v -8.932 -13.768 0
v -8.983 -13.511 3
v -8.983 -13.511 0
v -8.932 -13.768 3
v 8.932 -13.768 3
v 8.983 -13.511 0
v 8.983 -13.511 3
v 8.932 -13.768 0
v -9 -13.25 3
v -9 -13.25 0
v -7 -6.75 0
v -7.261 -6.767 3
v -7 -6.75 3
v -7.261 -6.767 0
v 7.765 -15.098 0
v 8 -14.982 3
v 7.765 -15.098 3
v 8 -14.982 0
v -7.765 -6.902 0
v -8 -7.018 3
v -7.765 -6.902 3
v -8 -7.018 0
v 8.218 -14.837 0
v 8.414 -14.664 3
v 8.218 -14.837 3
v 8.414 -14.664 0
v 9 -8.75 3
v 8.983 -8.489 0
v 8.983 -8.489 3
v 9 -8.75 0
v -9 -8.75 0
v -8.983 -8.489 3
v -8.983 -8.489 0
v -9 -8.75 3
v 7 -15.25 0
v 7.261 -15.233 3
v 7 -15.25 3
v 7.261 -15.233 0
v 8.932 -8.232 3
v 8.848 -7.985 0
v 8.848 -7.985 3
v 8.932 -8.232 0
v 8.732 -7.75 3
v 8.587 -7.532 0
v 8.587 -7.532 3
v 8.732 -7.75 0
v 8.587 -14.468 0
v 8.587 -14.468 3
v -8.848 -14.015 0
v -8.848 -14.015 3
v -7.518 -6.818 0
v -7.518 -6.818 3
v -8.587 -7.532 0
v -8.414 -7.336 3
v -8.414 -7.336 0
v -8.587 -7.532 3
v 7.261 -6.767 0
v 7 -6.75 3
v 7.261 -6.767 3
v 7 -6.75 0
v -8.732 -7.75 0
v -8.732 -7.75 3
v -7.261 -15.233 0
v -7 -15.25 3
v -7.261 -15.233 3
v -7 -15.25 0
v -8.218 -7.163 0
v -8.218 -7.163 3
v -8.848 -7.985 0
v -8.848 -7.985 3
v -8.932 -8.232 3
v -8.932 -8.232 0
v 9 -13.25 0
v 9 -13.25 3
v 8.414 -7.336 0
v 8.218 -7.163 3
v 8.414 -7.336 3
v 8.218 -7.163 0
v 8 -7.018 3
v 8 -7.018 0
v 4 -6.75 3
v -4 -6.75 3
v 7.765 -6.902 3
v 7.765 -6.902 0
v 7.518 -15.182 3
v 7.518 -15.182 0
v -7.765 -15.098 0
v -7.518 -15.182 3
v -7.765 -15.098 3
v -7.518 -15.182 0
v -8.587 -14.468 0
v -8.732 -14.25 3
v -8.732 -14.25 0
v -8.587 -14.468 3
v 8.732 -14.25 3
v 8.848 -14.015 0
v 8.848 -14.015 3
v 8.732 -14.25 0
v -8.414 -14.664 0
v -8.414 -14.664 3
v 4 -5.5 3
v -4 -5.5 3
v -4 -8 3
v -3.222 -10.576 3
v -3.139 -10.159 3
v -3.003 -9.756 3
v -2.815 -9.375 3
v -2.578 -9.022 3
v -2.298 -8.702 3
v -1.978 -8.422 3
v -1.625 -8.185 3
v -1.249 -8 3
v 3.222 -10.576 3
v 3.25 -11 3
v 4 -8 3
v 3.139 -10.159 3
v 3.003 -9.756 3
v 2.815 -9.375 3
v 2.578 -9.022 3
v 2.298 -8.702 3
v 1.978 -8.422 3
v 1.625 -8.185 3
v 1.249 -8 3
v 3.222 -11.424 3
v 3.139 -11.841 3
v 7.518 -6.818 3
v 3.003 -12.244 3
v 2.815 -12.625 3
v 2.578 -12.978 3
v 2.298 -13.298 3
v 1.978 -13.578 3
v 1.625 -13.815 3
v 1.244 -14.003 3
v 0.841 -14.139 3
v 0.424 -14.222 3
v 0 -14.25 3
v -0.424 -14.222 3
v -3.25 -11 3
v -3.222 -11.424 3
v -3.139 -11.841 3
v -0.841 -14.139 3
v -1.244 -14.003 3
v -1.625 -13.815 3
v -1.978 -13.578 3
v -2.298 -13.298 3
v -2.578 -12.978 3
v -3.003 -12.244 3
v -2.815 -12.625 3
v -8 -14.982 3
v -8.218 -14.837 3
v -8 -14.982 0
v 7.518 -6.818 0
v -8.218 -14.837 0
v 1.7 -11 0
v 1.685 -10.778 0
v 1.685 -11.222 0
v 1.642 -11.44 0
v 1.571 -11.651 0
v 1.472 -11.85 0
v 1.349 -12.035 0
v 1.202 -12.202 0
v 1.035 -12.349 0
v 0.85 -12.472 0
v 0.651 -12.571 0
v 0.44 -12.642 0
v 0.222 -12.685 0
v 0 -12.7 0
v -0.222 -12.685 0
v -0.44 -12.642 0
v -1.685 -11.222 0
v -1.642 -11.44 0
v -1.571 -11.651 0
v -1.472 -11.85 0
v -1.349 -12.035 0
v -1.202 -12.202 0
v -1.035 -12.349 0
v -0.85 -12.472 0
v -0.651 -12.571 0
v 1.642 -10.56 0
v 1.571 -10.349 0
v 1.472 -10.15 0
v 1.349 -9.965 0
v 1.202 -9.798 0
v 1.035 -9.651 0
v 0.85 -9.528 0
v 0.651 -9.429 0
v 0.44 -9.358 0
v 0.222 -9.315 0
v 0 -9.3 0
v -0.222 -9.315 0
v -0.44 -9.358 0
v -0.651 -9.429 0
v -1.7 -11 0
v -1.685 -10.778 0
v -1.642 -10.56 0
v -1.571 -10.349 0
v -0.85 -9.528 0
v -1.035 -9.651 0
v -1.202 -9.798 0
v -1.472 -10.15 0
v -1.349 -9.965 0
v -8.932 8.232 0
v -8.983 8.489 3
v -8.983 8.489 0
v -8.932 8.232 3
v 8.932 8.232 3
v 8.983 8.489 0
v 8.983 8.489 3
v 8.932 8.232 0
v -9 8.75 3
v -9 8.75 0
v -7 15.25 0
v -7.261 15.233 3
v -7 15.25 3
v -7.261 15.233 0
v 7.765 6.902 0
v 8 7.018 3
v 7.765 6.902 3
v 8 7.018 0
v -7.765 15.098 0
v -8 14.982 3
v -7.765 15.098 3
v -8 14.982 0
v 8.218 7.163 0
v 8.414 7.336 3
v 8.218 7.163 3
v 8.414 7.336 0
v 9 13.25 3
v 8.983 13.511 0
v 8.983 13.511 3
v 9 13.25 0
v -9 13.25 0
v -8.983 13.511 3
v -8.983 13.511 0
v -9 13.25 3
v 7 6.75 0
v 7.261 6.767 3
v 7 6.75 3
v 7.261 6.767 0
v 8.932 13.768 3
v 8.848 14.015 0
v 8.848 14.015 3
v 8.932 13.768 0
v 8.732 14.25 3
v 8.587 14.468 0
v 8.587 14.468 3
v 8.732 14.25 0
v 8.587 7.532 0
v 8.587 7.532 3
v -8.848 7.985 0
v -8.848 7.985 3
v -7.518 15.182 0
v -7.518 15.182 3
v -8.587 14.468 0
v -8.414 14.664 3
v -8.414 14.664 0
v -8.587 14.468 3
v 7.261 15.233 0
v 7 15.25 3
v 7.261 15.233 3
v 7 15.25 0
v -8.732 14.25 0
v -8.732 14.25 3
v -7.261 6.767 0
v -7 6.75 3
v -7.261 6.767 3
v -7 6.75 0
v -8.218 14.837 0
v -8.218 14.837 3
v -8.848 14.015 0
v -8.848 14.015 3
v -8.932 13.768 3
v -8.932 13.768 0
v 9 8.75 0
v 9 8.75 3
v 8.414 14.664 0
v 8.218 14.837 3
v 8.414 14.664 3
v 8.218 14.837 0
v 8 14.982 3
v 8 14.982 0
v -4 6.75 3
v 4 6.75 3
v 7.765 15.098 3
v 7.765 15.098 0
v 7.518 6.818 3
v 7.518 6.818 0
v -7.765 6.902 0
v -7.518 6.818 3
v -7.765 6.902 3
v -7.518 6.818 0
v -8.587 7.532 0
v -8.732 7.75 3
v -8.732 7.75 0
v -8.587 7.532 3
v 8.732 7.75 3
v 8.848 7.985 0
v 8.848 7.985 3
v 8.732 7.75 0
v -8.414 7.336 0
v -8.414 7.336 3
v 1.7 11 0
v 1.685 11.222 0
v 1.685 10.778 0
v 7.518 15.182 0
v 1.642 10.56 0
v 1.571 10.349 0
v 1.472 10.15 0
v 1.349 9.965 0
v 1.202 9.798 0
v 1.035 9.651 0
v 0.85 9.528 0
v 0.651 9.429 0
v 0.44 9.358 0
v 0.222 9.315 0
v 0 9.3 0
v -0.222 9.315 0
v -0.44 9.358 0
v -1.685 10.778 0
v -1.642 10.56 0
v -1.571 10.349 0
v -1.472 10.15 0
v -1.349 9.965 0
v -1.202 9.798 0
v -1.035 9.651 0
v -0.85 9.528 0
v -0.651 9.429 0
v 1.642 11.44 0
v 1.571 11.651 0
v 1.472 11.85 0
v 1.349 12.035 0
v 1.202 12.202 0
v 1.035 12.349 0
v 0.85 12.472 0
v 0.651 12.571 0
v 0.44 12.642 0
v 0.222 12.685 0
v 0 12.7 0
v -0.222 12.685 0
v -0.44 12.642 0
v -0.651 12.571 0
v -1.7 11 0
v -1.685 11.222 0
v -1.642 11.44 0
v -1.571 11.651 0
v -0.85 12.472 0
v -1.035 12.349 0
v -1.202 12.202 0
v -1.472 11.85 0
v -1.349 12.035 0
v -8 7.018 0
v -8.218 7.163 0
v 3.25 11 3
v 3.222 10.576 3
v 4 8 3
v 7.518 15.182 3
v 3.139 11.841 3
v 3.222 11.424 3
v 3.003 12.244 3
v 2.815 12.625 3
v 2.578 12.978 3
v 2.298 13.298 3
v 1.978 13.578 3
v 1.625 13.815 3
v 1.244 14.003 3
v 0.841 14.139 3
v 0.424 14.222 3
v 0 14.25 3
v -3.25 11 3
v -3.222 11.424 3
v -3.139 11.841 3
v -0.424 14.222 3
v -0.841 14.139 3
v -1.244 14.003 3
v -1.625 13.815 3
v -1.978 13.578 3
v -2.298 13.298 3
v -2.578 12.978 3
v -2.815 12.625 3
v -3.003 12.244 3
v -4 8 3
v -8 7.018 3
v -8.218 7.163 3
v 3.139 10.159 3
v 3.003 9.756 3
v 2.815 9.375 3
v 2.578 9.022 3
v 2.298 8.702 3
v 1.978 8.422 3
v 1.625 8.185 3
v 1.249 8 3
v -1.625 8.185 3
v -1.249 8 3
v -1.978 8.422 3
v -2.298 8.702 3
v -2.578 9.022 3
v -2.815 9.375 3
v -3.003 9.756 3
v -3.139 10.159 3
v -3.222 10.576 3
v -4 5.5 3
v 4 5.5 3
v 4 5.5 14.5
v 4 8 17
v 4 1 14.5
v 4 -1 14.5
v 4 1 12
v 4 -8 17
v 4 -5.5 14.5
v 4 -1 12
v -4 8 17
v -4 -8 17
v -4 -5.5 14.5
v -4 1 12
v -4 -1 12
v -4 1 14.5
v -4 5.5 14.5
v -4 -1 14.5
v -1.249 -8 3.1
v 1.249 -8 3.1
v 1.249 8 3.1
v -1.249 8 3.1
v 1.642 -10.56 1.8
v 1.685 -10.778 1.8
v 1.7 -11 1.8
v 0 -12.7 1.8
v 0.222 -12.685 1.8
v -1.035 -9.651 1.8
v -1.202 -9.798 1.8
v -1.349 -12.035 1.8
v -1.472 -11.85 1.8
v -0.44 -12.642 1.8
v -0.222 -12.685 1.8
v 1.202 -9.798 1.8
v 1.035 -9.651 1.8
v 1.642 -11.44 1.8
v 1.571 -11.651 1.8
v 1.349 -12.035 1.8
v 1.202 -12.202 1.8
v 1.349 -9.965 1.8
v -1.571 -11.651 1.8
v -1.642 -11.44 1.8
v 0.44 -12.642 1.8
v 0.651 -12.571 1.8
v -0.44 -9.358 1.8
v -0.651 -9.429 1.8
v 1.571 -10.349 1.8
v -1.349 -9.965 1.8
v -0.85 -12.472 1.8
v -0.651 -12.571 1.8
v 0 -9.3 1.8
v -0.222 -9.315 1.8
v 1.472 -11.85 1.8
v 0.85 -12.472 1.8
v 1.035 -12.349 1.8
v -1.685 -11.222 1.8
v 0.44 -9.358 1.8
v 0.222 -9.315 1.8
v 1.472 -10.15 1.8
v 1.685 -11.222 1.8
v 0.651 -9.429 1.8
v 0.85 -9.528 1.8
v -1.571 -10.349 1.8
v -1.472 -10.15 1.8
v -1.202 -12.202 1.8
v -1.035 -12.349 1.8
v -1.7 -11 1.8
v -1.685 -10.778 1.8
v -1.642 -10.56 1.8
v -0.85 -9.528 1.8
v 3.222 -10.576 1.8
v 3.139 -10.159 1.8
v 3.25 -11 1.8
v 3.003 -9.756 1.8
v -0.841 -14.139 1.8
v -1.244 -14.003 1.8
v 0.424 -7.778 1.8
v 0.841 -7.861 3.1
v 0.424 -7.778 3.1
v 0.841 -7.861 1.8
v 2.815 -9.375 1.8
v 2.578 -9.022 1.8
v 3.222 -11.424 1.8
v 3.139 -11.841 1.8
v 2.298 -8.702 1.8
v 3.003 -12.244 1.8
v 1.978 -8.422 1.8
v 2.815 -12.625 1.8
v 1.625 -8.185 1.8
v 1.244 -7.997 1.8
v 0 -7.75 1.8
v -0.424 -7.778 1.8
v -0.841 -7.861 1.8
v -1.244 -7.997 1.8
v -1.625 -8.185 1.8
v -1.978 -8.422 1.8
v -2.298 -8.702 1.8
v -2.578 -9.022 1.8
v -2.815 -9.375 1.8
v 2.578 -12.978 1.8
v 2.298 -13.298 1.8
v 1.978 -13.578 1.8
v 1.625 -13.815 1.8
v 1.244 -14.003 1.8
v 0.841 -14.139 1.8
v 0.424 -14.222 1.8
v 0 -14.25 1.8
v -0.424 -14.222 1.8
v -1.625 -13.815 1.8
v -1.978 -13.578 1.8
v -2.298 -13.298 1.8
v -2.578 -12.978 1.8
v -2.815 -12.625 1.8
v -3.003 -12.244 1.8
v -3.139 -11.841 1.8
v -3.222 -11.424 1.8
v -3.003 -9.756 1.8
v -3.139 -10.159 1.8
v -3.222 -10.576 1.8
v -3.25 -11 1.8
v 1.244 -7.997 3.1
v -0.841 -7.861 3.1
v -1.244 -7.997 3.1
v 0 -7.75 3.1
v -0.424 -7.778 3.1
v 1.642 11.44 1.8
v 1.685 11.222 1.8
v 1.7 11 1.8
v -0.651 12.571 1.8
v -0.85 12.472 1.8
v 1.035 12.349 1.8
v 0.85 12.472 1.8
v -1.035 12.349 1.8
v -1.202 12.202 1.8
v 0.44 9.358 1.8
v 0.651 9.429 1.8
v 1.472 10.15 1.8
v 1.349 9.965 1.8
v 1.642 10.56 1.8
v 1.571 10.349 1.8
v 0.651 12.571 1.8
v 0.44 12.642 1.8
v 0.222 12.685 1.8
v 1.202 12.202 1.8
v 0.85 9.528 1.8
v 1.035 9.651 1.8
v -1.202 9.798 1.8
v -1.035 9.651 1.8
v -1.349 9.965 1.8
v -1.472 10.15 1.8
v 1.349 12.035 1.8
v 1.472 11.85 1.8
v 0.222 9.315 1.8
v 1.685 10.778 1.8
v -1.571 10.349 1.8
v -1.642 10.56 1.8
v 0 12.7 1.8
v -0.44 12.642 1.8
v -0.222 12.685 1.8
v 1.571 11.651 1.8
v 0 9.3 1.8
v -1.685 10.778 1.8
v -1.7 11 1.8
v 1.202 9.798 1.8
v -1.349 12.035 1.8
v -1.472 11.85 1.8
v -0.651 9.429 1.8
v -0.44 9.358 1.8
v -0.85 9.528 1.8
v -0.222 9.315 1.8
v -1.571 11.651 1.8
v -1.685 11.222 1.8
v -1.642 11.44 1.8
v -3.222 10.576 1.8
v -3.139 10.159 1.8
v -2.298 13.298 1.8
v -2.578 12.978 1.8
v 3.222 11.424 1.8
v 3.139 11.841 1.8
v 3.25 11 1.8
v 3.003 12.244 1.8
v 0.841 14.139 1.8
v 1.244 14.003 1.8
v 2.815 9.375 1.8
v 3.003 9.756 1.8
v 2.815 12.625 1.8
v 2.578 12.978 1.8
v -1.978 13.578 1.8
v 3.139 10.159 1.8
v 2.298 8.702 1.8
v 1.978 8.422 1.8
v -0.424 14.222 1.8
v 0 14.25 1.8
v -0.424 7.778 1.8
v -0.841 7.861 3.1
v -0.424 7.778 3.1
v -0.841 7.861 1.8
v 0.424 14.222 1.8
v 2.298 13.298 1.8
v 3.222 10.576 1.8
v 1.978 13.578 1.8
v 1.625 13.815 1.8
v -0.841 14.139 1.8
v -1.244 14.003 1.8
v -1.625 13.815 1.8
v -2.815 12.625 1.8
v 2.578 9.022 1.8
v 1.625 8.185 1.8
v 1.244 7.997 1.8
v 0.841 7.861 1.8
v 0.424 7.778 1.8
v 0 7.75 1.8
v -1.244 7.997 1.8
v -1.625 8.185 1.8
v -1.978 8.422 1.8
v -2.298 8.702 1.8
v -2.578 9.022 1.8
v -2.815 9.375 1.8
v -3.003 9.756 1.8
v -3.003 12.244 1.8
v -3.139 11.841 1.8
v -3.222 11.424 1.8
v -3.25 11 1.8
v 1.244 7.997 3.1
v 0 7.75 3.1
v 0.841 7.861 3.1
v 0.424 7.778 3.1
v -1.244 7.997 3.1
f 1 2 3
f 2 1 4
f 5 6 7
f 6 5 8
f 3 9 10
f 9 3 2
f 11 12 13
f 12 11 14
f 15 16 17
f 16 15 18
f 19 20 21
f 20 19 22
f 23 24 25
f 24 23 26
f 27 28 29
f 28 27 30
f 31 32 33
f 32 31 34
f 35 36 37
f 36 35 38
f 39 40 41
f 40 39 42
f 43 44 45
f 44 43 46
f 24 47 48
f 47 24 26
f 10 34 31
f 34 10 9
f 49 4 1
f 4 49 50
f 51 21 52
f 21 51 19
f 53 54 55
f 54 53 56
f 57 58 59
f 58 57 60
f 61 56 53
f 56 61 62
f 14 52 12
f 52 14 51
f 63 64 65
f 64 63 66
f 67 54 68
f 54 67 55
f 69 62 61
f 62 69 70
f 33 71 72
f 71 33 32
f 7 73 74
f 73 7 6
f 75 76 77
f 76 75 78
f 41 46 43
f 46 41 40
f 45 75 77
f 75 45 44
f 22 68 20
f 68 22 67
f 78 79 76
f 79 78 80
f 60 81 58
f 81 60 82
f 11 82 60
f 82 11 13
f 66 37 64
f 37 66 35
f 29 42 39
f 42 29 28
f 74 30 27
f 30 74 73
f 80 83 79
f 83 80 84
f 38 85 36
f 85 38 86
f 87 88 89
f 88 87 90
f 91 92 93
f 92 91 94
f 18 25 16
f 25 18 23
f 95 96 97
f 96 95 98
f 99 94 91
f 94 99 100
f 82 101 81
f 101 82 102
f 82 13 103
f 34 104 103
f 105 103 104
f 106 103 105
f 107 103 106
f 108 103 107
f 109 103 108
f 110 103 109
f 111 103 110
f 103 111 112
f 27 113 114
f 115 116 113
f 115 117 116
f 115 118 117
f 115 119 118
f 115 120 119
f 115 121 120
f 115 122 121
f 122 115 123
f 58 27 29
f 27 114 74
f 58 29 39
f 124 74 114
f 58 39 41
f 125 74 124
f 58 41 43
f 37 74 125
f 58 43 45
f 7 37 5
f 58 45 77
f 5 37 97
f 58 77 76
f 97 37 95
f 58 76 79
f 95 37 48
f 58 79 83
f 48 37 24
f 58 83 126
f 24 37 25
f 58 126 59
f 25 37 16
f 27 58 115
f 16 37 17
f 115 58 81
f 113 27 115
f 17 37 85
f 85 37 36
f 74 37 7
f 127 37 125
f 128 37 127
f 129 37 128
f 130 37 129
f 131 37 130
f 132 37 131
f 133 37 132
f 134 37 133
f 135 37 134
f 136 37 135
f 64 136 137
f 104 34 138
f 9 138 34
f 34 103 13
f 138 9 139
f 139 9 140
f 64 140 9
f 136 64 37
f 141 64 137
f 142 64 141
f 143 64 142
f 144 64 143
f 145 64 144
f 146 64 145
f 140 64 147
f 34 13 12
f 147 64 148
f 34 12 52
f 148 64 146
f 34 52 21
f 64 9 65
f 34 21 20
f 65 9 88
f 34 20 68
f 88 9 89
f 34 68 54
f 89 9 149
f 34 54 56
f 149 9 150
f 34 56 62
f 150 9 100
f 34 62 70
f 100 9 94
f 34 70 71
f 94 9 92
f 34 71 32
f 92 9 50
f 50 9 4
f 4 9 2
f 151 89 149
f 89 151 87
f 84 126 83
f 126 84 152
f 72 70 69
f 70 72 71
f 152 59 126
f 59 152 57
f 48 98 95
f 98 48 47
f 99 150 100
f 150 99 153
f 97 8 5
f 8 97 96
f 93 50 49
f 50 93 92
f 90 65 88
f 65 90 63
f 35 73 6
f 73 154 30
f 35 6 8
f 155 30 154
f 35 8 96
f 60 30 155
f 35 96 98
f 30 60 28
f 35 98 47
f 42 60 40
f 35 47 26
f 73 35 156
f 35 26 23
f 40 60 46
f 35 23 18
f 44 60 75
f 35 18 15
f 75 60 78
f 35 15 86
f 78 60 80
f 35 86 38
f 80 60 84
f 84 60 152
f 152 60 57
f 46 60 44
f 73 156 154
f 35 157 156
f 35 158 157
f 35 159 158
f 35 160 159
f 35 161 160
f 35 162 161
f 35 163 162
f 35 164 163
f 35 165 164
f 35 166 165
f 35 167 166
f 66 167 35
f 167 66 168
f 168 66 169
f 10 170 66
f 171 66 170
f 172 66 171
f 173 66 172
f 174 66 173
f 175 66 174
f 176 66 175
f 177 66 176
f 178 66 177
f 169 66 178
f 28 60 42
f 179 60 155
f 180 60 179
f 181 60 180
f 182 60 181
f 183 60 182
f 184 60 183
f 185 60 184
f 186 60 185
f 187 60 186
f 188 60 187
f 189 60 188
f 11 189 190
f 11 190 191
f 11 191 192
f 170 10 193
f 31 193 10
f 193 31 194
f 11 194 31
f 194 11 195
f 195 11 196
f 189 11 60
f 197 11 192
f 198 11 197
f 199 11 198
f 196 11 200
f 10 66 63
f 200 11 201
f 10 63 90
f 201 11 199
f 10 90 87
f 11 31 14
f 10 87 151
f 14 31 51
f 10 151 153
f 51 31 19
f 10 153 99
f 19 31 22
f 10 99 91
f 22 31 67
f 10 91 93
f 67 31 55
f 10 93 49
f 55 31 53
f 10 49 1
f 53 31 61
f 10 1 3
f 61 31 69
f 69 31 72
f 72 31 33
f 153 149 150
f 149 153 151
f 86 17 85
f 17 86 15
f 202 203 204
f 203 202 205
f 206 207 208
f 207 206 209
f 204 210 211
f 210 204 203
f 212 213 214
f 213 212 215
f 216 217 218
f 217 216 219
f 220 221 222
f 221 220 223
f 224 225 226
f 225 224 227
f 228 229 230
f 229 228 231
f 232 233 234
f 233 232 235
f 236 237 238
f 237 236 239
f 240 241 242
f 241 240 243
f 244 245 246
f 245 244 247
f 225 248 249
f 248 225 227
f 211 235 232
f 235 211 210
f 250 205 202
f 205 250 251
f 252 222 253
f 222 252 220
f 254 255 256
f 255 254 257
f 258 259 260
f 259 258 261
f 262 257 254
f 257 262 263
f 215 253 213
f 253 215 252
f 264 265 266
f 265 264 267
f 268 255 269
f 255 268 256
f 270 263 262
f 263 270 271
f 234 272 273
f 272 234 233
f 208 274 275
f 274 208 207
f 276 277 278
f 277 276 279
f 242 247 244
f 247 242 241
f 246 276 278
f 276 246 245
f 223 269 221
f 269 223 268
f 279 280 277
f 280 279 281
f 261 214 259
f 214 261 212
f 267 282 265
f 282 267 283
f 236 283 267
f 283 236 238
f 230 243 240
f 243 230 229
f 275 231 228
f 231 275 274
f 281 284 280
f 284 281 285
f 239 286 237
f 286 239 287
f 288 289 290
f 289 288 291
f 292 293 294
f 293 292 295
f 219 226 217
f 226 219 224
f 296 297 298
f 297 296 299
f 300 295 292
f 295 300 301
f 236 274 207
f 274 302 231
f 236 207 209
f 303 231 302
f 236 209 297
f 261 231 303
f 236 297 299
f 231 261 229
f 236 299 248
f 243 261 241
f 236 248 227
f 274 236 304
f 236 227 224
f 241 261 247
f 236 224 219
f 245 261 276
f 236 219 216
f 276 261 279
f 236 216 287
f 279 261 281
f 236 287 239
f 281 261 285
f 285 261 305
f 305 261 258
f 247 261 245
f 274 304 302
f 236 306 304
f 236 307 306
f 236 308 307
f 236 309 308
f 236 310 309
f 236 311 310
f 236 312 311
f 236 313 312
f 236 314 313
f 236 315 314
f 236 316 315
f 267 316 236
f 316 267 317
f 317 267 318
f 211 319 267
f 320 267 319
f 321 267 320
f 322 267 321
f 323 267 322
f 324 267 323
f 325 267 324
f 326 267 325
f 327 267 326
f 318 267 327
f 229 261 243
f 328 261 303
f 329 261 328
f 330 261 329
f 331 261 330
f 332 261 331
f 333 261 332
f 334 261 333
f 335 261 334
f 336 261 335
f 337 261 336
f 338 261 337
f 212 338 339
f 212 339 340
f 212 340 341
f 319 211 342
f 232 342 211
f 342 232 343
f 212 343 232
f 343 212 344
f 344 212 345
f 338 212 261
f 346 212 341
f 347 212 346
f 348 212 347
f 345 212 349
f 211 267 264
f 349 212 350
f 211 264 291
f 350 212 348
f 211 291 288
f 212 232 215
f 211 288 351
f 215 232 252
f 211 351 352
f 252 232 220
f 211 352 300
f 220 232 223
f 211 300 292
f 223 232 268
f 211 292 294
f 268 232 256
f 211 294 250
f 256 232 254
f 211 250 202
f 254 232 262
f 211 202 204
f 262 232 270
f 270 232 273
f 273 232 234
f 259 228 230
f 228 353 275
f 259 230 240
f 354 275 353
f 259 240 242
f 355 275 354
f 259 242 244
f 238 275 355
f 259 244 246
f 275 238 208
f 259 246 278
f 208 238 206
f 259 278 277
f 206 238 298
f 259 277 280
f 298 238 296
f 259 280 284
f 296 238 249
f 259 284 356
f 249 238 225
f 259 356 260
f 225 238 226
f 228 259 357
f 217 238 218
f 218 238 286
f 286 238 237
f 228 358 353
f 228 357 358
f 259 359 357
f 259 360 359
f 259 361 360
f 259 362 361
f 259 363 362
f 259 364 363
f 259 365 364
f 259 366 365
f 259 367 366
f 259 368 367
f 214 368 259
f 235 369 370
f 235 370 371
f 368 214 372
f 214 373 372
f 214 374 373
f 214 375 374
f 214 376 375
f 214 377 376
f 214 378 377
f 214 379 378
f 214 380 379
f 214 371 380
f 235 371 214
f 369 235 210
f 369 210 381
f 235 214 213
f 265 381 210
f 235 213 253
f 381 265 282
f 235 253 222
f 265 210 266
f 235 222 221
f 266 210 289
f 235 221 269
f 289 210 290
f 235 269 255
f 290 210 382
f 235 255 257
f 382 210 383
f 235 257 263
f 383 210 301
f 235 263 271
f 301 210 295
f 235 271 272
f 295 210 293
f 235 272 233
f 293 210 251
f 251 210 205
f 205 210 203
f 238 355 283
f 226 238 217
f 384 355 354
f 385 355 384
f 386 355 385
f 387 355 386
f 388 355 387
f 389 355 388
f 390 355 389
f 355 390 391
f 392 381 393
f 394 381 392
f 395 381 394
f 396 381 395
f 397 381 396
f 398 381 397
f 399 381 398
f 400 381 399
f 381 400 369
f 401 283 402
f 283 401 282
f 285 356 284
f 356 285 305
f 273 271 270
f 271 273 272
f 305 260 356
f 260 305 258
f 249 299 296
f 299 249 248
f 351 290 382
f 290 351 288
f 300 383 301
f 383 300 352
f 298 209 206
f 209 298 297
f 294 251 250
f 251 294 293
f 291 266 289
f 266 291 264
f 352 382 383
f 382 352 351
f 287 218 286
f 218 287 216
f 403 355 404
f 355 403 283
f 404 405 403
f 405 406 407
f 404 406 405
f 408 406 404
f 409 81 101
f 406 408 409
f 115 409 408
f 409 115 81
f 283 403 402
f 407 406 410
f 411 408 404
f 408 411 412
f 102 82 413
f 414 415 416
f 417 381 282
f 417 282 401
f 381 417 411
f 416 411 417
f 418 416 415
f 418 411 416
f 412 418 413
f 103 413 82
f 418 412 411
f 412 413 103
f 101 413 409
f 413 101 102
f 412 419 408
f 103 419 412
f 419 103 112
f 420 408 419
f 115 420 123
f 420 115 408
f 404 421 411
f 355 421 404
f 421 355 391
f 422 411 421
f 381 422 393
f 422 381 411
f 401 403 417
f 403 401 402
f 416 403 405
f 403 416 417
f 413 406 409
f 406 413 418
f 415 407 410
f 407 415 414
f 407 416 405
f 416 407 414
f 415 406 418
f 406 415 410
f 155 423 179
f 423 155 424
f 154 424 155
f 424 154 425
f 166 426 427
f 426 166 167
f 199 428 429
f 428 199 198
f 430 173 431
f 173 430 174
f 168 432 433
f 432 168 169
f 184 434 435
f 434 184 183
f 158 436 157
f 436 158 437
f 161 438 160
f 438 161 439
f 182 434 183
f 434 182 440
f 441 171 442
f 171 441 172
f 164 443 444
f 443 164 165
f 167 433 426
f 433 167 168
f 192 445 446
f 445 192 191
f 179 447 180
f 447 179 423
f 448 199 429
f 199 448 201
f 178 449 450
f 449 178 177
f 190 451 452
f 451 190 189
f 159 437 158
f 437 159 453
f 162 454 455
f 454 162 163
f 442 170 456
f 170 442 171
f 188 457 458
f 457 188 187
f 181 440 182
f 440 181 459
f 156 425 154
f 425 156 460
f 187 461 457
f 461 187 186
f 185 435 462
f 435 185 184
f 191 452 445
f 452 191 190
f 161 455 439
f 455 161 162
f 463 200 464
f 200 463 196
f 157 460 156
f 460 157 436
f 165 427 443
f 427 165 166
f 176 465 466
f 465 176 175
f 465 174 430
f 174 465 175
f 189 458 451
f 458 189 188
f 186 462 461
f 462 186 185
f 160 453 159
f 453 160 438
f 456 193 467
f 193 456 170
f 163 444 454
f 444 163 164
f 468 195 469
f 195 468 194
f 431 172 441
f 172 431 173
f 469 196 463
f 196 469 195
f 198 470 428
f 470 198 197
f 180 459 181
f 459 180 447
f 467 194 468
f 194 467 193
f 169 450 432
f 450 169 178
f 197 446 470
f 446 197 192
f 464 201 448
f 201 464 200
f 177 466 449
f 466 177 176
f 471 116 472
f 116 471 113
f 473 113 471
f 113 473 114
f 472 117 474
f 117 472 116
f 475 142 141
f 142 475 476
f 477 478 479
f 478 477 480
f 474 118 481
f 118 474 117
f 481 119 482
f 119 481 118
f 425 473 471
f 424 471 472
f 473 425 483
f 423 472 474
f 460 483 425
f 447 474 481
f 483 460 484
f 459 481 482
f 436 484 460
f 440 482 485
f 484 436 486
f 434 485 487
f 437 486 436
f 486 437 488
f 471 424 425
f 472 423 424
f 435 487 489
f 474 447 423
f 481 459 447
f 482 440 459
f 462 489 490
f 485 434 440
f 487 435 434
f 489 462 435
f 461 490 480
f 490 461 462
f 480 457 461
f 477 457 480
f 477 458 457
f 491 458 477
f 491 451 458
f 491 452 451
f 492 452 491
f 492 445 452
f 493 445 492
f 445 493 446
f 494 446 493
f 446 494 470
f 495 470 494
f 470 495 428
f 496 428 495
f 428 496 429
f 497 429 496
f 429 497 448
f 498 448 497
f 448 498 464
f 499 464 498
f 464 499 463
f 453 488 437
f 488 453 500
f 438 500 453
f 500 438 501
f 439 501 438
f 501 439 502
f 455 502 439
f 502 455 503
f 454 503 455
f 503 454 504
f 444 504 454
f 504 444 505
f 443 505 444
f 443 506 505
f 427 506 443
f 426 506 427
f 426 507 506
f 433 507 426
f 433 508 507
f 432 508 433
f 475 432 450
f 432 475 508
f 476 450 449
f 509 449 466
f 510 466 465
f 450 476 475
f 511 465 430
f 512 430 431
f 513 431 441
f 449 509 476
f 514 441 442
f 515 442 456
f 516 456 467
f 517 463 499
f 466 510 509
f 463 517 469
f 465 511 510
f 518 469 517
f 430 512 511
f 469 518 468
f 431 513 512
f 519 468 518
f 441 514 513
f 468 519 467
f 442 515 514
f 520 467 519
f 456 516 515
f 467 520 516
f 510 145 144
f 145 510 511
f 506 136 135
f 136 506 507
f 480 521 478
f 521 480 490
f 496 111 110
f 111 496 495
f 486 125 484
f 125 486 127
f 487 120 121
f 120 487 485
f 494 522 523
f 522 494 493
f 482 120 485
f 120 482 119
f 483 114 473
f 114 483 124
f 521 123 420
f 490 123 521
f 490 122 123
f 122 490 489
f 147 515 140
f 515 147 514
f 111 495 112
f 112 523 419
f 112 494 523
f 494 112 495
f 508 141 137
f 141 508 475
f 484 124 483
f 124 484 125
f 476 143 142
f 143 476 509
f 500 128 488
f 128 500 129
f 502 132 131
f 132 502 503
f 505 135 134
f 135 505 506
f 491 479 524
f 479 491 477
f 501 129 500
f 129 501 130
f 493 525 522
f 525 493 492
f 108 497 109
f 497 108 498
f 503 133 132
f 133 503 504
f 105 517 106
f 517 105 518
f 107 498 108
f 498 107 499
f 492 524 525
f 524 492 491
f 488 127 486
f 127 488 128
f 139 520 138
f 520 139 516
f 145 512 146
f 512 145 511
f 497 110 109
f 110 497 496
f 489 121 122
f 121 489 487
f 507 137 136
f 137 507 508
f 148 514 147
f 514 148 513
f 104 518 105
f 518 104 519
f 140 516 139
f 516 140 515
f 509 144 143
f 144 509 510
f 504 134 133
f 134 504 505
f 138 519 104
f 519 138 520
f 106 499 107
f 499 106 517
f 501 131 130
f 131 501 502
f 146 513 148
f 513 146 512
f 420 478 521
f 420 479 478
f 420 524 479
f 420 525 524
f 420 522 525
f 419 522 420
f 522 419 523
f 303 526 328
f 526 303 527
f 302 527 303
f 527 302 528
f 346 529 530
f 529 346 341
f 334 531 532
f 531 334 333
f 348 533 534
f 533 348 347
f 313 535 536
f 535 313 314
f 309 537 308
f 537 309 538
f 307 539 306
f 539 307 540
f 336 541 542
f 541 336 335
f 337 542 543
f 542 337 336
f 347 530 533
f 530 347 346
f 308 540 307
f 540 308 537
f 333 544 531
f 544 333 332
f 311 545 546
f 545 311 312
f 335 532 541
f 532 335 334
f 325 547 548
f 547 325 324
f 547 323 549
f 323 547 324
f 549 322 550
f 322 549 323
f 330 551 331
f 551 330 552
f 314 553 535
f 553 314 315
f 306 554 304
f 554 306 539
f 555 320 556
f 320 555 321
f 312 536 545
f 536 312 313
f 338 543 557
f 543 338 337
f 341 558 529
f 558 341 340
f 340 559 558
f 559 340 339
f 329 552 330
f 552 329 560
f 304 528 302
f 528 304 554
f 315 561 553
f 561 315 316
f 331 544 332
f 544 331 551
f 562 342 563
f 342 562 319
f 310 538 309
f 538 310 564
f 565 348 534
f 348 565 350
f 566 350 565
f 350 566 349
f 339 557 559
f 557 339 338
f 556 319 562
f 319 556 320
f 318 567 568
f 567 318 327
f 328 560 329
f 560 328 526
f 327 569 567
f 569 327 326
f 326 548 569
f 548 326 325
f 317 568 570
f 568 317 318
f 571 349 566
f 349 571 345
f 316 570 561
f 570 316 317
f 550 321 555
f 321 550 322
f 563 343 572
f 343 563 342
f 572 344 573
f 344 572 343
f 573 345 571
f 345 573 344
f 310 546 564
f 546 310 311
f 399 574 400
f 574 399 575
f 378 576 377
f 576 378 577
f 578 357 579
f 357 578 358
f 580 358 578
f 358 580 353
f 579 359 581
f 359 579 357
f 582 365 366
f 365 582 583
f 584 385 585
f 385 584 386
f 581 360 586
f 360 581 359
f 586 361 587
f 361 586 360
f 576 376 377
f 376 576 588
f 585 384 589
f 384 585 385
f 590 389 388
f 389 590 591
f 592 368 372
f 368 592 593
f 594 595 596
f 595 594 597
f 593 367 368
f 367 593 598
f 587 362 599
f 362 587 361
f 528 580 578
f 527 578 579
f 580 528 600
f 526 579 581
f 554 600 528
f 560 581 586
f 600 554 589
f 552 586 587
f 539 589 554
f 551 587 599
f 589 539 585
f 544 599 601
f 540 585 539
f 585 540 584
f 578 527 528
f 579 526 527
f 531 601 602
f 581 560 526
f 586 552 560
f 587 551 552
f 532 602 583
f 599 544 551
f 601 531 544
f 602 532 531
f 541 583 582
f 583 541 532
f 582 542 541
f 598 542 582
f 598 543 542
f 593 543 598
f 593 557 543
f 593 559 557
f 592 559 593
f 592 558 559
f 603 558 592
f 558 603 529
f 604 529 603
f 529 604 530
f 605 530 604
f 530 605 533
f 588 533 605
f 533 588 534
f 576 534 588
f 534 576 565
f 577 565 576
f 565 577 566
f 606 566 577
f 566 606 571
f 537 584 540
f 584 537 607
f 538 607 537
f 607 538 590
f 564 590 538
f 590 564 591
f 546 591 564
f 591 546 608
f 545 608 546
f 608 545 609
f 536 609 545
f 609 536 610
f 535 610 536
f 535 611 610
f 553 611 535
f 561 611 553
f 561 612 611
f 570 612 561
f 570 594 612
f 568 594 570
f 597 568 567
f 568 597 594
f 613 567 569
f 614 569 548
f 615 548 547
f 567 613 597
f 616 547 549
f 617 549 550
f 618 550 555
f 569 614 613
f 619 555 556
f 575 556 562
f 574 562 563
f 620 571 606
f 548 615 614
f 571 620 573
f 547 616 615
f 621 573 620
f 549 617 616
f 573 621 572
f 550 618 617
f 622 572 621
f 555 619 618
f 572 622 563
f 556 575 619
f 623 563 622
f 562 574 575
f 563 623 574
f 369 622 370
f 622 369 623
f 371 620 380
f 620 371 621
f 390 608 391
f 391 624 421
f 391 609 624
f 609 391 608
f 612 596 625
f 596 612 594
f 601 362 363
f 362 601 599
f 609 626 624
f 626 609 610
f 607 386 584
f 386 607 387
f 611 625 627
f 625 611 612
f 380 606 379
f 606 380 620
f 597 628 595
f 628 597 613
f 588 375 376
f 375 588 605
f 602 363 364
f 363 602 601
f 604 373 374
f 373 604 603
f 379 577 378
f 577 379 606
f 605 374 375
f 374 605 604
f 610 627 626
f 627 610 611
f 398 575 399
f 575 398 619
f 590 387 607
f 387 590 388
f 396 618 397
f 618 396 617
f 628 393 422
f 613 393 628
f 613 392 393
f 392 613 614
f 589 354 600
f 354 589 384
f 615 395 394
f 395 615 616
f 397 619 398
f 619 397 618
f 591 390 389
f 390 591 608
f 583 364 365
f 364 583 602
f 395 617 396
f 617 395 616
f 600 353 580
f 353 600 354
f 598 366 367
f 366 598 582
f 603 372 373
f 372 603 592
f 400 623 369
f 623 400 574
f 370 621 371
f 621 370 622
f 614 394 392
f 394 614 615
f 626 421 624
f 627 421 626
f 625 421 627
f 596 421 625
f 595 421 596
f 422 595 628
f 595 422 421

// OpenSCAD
// Pattern: removable two-screw relay retainer strap.

$fn = 48;

relay_bracket_screw_spacing = 22;
relay_bracket_screw_clearance_diameter = 3.4;
relay_bracket_screw_head_clearance_diameter = 6.5;
relay_bracket_screw_head_recess_depth = 1.2;

base_thickness = 3;
bridge_height = 14;
wall_thickness = 2.5;
foot_width = 18;
foot_depth = 8.5;
bridge_width = 8;
bridge_length = relay_bracket_screw_spacing - foot_depth + 2;
capture_lip_height = 2.5;
capture_lip_depth = 2;

module rounded_box_2d(w, d, r) {
    rr = min(r, min(w, d) / 2 - 0.01);
    hull()
        for (x = [rr, w - rr])
            for (y = [rr, d - rr])
                translate([x, y])
                    circle(r = rr);
}

module centered_rounded_block(size, r = 1) {
    linear_extrude(height = size[2])
        translate([-size[0] / 2, -size[1] / 2])
            rounded_box_2d(size[0], size[1], r);
}

module relay_retainer_bracket() {
    difference() {
        union() {
            for (sy = [-1, 1])
                translate([0, sy * relay_bracket_screw_spacing / 2, 0])
                    centered_rounded_block([foot_width, foot_depth, base_thickness], 2);

            for (sy = [-1, 1])
                translate([
                    -bridge_width / 2,
                    sy * (relay_bracket_screw_spacing / 2 - foot_depth / 2)
                        - wall_thickness / 2,
                    base_thickness
                ])
                    cube([bridge_width, wall_thickness, bridge_height]);

            translate([
                -bridge_width / 2,
                -bridge_length / 2,
                base_thickness + bridge_height - wall_thickness
            ])
                cube([bridge_width, bridge_length, wall_thickness]);

            translate([
                -bridge_width / 2,
                -capture_lip_depth / 2,
                base_thickness + bridge_height - wall_thickness - capture_lip_height
            ])
                cube([bridge_width, capture_lip_depth, capture_lip_height]);
        }

        for (sy = [-1, 1]) {
            translate([0, sy * relay_bracket_screw_spacing / 2, -0.05])
                cylinder(h = base_thickness + bridge_height + 1, d = relay_bracket_screw_clearance_diameter);

            translate([
                0,
                sy * relay_bracket_screw_spacing / 2,
                base_thickness - relay_bracket_screw_head_recess_depth
            ])
                cylinder(h = relay_bracket_screw_head_recess_depth + 0.1, d = relay_bracket_screw_head_clearance_diameter);
        }
    }
}

relay_retainer_bracket();
